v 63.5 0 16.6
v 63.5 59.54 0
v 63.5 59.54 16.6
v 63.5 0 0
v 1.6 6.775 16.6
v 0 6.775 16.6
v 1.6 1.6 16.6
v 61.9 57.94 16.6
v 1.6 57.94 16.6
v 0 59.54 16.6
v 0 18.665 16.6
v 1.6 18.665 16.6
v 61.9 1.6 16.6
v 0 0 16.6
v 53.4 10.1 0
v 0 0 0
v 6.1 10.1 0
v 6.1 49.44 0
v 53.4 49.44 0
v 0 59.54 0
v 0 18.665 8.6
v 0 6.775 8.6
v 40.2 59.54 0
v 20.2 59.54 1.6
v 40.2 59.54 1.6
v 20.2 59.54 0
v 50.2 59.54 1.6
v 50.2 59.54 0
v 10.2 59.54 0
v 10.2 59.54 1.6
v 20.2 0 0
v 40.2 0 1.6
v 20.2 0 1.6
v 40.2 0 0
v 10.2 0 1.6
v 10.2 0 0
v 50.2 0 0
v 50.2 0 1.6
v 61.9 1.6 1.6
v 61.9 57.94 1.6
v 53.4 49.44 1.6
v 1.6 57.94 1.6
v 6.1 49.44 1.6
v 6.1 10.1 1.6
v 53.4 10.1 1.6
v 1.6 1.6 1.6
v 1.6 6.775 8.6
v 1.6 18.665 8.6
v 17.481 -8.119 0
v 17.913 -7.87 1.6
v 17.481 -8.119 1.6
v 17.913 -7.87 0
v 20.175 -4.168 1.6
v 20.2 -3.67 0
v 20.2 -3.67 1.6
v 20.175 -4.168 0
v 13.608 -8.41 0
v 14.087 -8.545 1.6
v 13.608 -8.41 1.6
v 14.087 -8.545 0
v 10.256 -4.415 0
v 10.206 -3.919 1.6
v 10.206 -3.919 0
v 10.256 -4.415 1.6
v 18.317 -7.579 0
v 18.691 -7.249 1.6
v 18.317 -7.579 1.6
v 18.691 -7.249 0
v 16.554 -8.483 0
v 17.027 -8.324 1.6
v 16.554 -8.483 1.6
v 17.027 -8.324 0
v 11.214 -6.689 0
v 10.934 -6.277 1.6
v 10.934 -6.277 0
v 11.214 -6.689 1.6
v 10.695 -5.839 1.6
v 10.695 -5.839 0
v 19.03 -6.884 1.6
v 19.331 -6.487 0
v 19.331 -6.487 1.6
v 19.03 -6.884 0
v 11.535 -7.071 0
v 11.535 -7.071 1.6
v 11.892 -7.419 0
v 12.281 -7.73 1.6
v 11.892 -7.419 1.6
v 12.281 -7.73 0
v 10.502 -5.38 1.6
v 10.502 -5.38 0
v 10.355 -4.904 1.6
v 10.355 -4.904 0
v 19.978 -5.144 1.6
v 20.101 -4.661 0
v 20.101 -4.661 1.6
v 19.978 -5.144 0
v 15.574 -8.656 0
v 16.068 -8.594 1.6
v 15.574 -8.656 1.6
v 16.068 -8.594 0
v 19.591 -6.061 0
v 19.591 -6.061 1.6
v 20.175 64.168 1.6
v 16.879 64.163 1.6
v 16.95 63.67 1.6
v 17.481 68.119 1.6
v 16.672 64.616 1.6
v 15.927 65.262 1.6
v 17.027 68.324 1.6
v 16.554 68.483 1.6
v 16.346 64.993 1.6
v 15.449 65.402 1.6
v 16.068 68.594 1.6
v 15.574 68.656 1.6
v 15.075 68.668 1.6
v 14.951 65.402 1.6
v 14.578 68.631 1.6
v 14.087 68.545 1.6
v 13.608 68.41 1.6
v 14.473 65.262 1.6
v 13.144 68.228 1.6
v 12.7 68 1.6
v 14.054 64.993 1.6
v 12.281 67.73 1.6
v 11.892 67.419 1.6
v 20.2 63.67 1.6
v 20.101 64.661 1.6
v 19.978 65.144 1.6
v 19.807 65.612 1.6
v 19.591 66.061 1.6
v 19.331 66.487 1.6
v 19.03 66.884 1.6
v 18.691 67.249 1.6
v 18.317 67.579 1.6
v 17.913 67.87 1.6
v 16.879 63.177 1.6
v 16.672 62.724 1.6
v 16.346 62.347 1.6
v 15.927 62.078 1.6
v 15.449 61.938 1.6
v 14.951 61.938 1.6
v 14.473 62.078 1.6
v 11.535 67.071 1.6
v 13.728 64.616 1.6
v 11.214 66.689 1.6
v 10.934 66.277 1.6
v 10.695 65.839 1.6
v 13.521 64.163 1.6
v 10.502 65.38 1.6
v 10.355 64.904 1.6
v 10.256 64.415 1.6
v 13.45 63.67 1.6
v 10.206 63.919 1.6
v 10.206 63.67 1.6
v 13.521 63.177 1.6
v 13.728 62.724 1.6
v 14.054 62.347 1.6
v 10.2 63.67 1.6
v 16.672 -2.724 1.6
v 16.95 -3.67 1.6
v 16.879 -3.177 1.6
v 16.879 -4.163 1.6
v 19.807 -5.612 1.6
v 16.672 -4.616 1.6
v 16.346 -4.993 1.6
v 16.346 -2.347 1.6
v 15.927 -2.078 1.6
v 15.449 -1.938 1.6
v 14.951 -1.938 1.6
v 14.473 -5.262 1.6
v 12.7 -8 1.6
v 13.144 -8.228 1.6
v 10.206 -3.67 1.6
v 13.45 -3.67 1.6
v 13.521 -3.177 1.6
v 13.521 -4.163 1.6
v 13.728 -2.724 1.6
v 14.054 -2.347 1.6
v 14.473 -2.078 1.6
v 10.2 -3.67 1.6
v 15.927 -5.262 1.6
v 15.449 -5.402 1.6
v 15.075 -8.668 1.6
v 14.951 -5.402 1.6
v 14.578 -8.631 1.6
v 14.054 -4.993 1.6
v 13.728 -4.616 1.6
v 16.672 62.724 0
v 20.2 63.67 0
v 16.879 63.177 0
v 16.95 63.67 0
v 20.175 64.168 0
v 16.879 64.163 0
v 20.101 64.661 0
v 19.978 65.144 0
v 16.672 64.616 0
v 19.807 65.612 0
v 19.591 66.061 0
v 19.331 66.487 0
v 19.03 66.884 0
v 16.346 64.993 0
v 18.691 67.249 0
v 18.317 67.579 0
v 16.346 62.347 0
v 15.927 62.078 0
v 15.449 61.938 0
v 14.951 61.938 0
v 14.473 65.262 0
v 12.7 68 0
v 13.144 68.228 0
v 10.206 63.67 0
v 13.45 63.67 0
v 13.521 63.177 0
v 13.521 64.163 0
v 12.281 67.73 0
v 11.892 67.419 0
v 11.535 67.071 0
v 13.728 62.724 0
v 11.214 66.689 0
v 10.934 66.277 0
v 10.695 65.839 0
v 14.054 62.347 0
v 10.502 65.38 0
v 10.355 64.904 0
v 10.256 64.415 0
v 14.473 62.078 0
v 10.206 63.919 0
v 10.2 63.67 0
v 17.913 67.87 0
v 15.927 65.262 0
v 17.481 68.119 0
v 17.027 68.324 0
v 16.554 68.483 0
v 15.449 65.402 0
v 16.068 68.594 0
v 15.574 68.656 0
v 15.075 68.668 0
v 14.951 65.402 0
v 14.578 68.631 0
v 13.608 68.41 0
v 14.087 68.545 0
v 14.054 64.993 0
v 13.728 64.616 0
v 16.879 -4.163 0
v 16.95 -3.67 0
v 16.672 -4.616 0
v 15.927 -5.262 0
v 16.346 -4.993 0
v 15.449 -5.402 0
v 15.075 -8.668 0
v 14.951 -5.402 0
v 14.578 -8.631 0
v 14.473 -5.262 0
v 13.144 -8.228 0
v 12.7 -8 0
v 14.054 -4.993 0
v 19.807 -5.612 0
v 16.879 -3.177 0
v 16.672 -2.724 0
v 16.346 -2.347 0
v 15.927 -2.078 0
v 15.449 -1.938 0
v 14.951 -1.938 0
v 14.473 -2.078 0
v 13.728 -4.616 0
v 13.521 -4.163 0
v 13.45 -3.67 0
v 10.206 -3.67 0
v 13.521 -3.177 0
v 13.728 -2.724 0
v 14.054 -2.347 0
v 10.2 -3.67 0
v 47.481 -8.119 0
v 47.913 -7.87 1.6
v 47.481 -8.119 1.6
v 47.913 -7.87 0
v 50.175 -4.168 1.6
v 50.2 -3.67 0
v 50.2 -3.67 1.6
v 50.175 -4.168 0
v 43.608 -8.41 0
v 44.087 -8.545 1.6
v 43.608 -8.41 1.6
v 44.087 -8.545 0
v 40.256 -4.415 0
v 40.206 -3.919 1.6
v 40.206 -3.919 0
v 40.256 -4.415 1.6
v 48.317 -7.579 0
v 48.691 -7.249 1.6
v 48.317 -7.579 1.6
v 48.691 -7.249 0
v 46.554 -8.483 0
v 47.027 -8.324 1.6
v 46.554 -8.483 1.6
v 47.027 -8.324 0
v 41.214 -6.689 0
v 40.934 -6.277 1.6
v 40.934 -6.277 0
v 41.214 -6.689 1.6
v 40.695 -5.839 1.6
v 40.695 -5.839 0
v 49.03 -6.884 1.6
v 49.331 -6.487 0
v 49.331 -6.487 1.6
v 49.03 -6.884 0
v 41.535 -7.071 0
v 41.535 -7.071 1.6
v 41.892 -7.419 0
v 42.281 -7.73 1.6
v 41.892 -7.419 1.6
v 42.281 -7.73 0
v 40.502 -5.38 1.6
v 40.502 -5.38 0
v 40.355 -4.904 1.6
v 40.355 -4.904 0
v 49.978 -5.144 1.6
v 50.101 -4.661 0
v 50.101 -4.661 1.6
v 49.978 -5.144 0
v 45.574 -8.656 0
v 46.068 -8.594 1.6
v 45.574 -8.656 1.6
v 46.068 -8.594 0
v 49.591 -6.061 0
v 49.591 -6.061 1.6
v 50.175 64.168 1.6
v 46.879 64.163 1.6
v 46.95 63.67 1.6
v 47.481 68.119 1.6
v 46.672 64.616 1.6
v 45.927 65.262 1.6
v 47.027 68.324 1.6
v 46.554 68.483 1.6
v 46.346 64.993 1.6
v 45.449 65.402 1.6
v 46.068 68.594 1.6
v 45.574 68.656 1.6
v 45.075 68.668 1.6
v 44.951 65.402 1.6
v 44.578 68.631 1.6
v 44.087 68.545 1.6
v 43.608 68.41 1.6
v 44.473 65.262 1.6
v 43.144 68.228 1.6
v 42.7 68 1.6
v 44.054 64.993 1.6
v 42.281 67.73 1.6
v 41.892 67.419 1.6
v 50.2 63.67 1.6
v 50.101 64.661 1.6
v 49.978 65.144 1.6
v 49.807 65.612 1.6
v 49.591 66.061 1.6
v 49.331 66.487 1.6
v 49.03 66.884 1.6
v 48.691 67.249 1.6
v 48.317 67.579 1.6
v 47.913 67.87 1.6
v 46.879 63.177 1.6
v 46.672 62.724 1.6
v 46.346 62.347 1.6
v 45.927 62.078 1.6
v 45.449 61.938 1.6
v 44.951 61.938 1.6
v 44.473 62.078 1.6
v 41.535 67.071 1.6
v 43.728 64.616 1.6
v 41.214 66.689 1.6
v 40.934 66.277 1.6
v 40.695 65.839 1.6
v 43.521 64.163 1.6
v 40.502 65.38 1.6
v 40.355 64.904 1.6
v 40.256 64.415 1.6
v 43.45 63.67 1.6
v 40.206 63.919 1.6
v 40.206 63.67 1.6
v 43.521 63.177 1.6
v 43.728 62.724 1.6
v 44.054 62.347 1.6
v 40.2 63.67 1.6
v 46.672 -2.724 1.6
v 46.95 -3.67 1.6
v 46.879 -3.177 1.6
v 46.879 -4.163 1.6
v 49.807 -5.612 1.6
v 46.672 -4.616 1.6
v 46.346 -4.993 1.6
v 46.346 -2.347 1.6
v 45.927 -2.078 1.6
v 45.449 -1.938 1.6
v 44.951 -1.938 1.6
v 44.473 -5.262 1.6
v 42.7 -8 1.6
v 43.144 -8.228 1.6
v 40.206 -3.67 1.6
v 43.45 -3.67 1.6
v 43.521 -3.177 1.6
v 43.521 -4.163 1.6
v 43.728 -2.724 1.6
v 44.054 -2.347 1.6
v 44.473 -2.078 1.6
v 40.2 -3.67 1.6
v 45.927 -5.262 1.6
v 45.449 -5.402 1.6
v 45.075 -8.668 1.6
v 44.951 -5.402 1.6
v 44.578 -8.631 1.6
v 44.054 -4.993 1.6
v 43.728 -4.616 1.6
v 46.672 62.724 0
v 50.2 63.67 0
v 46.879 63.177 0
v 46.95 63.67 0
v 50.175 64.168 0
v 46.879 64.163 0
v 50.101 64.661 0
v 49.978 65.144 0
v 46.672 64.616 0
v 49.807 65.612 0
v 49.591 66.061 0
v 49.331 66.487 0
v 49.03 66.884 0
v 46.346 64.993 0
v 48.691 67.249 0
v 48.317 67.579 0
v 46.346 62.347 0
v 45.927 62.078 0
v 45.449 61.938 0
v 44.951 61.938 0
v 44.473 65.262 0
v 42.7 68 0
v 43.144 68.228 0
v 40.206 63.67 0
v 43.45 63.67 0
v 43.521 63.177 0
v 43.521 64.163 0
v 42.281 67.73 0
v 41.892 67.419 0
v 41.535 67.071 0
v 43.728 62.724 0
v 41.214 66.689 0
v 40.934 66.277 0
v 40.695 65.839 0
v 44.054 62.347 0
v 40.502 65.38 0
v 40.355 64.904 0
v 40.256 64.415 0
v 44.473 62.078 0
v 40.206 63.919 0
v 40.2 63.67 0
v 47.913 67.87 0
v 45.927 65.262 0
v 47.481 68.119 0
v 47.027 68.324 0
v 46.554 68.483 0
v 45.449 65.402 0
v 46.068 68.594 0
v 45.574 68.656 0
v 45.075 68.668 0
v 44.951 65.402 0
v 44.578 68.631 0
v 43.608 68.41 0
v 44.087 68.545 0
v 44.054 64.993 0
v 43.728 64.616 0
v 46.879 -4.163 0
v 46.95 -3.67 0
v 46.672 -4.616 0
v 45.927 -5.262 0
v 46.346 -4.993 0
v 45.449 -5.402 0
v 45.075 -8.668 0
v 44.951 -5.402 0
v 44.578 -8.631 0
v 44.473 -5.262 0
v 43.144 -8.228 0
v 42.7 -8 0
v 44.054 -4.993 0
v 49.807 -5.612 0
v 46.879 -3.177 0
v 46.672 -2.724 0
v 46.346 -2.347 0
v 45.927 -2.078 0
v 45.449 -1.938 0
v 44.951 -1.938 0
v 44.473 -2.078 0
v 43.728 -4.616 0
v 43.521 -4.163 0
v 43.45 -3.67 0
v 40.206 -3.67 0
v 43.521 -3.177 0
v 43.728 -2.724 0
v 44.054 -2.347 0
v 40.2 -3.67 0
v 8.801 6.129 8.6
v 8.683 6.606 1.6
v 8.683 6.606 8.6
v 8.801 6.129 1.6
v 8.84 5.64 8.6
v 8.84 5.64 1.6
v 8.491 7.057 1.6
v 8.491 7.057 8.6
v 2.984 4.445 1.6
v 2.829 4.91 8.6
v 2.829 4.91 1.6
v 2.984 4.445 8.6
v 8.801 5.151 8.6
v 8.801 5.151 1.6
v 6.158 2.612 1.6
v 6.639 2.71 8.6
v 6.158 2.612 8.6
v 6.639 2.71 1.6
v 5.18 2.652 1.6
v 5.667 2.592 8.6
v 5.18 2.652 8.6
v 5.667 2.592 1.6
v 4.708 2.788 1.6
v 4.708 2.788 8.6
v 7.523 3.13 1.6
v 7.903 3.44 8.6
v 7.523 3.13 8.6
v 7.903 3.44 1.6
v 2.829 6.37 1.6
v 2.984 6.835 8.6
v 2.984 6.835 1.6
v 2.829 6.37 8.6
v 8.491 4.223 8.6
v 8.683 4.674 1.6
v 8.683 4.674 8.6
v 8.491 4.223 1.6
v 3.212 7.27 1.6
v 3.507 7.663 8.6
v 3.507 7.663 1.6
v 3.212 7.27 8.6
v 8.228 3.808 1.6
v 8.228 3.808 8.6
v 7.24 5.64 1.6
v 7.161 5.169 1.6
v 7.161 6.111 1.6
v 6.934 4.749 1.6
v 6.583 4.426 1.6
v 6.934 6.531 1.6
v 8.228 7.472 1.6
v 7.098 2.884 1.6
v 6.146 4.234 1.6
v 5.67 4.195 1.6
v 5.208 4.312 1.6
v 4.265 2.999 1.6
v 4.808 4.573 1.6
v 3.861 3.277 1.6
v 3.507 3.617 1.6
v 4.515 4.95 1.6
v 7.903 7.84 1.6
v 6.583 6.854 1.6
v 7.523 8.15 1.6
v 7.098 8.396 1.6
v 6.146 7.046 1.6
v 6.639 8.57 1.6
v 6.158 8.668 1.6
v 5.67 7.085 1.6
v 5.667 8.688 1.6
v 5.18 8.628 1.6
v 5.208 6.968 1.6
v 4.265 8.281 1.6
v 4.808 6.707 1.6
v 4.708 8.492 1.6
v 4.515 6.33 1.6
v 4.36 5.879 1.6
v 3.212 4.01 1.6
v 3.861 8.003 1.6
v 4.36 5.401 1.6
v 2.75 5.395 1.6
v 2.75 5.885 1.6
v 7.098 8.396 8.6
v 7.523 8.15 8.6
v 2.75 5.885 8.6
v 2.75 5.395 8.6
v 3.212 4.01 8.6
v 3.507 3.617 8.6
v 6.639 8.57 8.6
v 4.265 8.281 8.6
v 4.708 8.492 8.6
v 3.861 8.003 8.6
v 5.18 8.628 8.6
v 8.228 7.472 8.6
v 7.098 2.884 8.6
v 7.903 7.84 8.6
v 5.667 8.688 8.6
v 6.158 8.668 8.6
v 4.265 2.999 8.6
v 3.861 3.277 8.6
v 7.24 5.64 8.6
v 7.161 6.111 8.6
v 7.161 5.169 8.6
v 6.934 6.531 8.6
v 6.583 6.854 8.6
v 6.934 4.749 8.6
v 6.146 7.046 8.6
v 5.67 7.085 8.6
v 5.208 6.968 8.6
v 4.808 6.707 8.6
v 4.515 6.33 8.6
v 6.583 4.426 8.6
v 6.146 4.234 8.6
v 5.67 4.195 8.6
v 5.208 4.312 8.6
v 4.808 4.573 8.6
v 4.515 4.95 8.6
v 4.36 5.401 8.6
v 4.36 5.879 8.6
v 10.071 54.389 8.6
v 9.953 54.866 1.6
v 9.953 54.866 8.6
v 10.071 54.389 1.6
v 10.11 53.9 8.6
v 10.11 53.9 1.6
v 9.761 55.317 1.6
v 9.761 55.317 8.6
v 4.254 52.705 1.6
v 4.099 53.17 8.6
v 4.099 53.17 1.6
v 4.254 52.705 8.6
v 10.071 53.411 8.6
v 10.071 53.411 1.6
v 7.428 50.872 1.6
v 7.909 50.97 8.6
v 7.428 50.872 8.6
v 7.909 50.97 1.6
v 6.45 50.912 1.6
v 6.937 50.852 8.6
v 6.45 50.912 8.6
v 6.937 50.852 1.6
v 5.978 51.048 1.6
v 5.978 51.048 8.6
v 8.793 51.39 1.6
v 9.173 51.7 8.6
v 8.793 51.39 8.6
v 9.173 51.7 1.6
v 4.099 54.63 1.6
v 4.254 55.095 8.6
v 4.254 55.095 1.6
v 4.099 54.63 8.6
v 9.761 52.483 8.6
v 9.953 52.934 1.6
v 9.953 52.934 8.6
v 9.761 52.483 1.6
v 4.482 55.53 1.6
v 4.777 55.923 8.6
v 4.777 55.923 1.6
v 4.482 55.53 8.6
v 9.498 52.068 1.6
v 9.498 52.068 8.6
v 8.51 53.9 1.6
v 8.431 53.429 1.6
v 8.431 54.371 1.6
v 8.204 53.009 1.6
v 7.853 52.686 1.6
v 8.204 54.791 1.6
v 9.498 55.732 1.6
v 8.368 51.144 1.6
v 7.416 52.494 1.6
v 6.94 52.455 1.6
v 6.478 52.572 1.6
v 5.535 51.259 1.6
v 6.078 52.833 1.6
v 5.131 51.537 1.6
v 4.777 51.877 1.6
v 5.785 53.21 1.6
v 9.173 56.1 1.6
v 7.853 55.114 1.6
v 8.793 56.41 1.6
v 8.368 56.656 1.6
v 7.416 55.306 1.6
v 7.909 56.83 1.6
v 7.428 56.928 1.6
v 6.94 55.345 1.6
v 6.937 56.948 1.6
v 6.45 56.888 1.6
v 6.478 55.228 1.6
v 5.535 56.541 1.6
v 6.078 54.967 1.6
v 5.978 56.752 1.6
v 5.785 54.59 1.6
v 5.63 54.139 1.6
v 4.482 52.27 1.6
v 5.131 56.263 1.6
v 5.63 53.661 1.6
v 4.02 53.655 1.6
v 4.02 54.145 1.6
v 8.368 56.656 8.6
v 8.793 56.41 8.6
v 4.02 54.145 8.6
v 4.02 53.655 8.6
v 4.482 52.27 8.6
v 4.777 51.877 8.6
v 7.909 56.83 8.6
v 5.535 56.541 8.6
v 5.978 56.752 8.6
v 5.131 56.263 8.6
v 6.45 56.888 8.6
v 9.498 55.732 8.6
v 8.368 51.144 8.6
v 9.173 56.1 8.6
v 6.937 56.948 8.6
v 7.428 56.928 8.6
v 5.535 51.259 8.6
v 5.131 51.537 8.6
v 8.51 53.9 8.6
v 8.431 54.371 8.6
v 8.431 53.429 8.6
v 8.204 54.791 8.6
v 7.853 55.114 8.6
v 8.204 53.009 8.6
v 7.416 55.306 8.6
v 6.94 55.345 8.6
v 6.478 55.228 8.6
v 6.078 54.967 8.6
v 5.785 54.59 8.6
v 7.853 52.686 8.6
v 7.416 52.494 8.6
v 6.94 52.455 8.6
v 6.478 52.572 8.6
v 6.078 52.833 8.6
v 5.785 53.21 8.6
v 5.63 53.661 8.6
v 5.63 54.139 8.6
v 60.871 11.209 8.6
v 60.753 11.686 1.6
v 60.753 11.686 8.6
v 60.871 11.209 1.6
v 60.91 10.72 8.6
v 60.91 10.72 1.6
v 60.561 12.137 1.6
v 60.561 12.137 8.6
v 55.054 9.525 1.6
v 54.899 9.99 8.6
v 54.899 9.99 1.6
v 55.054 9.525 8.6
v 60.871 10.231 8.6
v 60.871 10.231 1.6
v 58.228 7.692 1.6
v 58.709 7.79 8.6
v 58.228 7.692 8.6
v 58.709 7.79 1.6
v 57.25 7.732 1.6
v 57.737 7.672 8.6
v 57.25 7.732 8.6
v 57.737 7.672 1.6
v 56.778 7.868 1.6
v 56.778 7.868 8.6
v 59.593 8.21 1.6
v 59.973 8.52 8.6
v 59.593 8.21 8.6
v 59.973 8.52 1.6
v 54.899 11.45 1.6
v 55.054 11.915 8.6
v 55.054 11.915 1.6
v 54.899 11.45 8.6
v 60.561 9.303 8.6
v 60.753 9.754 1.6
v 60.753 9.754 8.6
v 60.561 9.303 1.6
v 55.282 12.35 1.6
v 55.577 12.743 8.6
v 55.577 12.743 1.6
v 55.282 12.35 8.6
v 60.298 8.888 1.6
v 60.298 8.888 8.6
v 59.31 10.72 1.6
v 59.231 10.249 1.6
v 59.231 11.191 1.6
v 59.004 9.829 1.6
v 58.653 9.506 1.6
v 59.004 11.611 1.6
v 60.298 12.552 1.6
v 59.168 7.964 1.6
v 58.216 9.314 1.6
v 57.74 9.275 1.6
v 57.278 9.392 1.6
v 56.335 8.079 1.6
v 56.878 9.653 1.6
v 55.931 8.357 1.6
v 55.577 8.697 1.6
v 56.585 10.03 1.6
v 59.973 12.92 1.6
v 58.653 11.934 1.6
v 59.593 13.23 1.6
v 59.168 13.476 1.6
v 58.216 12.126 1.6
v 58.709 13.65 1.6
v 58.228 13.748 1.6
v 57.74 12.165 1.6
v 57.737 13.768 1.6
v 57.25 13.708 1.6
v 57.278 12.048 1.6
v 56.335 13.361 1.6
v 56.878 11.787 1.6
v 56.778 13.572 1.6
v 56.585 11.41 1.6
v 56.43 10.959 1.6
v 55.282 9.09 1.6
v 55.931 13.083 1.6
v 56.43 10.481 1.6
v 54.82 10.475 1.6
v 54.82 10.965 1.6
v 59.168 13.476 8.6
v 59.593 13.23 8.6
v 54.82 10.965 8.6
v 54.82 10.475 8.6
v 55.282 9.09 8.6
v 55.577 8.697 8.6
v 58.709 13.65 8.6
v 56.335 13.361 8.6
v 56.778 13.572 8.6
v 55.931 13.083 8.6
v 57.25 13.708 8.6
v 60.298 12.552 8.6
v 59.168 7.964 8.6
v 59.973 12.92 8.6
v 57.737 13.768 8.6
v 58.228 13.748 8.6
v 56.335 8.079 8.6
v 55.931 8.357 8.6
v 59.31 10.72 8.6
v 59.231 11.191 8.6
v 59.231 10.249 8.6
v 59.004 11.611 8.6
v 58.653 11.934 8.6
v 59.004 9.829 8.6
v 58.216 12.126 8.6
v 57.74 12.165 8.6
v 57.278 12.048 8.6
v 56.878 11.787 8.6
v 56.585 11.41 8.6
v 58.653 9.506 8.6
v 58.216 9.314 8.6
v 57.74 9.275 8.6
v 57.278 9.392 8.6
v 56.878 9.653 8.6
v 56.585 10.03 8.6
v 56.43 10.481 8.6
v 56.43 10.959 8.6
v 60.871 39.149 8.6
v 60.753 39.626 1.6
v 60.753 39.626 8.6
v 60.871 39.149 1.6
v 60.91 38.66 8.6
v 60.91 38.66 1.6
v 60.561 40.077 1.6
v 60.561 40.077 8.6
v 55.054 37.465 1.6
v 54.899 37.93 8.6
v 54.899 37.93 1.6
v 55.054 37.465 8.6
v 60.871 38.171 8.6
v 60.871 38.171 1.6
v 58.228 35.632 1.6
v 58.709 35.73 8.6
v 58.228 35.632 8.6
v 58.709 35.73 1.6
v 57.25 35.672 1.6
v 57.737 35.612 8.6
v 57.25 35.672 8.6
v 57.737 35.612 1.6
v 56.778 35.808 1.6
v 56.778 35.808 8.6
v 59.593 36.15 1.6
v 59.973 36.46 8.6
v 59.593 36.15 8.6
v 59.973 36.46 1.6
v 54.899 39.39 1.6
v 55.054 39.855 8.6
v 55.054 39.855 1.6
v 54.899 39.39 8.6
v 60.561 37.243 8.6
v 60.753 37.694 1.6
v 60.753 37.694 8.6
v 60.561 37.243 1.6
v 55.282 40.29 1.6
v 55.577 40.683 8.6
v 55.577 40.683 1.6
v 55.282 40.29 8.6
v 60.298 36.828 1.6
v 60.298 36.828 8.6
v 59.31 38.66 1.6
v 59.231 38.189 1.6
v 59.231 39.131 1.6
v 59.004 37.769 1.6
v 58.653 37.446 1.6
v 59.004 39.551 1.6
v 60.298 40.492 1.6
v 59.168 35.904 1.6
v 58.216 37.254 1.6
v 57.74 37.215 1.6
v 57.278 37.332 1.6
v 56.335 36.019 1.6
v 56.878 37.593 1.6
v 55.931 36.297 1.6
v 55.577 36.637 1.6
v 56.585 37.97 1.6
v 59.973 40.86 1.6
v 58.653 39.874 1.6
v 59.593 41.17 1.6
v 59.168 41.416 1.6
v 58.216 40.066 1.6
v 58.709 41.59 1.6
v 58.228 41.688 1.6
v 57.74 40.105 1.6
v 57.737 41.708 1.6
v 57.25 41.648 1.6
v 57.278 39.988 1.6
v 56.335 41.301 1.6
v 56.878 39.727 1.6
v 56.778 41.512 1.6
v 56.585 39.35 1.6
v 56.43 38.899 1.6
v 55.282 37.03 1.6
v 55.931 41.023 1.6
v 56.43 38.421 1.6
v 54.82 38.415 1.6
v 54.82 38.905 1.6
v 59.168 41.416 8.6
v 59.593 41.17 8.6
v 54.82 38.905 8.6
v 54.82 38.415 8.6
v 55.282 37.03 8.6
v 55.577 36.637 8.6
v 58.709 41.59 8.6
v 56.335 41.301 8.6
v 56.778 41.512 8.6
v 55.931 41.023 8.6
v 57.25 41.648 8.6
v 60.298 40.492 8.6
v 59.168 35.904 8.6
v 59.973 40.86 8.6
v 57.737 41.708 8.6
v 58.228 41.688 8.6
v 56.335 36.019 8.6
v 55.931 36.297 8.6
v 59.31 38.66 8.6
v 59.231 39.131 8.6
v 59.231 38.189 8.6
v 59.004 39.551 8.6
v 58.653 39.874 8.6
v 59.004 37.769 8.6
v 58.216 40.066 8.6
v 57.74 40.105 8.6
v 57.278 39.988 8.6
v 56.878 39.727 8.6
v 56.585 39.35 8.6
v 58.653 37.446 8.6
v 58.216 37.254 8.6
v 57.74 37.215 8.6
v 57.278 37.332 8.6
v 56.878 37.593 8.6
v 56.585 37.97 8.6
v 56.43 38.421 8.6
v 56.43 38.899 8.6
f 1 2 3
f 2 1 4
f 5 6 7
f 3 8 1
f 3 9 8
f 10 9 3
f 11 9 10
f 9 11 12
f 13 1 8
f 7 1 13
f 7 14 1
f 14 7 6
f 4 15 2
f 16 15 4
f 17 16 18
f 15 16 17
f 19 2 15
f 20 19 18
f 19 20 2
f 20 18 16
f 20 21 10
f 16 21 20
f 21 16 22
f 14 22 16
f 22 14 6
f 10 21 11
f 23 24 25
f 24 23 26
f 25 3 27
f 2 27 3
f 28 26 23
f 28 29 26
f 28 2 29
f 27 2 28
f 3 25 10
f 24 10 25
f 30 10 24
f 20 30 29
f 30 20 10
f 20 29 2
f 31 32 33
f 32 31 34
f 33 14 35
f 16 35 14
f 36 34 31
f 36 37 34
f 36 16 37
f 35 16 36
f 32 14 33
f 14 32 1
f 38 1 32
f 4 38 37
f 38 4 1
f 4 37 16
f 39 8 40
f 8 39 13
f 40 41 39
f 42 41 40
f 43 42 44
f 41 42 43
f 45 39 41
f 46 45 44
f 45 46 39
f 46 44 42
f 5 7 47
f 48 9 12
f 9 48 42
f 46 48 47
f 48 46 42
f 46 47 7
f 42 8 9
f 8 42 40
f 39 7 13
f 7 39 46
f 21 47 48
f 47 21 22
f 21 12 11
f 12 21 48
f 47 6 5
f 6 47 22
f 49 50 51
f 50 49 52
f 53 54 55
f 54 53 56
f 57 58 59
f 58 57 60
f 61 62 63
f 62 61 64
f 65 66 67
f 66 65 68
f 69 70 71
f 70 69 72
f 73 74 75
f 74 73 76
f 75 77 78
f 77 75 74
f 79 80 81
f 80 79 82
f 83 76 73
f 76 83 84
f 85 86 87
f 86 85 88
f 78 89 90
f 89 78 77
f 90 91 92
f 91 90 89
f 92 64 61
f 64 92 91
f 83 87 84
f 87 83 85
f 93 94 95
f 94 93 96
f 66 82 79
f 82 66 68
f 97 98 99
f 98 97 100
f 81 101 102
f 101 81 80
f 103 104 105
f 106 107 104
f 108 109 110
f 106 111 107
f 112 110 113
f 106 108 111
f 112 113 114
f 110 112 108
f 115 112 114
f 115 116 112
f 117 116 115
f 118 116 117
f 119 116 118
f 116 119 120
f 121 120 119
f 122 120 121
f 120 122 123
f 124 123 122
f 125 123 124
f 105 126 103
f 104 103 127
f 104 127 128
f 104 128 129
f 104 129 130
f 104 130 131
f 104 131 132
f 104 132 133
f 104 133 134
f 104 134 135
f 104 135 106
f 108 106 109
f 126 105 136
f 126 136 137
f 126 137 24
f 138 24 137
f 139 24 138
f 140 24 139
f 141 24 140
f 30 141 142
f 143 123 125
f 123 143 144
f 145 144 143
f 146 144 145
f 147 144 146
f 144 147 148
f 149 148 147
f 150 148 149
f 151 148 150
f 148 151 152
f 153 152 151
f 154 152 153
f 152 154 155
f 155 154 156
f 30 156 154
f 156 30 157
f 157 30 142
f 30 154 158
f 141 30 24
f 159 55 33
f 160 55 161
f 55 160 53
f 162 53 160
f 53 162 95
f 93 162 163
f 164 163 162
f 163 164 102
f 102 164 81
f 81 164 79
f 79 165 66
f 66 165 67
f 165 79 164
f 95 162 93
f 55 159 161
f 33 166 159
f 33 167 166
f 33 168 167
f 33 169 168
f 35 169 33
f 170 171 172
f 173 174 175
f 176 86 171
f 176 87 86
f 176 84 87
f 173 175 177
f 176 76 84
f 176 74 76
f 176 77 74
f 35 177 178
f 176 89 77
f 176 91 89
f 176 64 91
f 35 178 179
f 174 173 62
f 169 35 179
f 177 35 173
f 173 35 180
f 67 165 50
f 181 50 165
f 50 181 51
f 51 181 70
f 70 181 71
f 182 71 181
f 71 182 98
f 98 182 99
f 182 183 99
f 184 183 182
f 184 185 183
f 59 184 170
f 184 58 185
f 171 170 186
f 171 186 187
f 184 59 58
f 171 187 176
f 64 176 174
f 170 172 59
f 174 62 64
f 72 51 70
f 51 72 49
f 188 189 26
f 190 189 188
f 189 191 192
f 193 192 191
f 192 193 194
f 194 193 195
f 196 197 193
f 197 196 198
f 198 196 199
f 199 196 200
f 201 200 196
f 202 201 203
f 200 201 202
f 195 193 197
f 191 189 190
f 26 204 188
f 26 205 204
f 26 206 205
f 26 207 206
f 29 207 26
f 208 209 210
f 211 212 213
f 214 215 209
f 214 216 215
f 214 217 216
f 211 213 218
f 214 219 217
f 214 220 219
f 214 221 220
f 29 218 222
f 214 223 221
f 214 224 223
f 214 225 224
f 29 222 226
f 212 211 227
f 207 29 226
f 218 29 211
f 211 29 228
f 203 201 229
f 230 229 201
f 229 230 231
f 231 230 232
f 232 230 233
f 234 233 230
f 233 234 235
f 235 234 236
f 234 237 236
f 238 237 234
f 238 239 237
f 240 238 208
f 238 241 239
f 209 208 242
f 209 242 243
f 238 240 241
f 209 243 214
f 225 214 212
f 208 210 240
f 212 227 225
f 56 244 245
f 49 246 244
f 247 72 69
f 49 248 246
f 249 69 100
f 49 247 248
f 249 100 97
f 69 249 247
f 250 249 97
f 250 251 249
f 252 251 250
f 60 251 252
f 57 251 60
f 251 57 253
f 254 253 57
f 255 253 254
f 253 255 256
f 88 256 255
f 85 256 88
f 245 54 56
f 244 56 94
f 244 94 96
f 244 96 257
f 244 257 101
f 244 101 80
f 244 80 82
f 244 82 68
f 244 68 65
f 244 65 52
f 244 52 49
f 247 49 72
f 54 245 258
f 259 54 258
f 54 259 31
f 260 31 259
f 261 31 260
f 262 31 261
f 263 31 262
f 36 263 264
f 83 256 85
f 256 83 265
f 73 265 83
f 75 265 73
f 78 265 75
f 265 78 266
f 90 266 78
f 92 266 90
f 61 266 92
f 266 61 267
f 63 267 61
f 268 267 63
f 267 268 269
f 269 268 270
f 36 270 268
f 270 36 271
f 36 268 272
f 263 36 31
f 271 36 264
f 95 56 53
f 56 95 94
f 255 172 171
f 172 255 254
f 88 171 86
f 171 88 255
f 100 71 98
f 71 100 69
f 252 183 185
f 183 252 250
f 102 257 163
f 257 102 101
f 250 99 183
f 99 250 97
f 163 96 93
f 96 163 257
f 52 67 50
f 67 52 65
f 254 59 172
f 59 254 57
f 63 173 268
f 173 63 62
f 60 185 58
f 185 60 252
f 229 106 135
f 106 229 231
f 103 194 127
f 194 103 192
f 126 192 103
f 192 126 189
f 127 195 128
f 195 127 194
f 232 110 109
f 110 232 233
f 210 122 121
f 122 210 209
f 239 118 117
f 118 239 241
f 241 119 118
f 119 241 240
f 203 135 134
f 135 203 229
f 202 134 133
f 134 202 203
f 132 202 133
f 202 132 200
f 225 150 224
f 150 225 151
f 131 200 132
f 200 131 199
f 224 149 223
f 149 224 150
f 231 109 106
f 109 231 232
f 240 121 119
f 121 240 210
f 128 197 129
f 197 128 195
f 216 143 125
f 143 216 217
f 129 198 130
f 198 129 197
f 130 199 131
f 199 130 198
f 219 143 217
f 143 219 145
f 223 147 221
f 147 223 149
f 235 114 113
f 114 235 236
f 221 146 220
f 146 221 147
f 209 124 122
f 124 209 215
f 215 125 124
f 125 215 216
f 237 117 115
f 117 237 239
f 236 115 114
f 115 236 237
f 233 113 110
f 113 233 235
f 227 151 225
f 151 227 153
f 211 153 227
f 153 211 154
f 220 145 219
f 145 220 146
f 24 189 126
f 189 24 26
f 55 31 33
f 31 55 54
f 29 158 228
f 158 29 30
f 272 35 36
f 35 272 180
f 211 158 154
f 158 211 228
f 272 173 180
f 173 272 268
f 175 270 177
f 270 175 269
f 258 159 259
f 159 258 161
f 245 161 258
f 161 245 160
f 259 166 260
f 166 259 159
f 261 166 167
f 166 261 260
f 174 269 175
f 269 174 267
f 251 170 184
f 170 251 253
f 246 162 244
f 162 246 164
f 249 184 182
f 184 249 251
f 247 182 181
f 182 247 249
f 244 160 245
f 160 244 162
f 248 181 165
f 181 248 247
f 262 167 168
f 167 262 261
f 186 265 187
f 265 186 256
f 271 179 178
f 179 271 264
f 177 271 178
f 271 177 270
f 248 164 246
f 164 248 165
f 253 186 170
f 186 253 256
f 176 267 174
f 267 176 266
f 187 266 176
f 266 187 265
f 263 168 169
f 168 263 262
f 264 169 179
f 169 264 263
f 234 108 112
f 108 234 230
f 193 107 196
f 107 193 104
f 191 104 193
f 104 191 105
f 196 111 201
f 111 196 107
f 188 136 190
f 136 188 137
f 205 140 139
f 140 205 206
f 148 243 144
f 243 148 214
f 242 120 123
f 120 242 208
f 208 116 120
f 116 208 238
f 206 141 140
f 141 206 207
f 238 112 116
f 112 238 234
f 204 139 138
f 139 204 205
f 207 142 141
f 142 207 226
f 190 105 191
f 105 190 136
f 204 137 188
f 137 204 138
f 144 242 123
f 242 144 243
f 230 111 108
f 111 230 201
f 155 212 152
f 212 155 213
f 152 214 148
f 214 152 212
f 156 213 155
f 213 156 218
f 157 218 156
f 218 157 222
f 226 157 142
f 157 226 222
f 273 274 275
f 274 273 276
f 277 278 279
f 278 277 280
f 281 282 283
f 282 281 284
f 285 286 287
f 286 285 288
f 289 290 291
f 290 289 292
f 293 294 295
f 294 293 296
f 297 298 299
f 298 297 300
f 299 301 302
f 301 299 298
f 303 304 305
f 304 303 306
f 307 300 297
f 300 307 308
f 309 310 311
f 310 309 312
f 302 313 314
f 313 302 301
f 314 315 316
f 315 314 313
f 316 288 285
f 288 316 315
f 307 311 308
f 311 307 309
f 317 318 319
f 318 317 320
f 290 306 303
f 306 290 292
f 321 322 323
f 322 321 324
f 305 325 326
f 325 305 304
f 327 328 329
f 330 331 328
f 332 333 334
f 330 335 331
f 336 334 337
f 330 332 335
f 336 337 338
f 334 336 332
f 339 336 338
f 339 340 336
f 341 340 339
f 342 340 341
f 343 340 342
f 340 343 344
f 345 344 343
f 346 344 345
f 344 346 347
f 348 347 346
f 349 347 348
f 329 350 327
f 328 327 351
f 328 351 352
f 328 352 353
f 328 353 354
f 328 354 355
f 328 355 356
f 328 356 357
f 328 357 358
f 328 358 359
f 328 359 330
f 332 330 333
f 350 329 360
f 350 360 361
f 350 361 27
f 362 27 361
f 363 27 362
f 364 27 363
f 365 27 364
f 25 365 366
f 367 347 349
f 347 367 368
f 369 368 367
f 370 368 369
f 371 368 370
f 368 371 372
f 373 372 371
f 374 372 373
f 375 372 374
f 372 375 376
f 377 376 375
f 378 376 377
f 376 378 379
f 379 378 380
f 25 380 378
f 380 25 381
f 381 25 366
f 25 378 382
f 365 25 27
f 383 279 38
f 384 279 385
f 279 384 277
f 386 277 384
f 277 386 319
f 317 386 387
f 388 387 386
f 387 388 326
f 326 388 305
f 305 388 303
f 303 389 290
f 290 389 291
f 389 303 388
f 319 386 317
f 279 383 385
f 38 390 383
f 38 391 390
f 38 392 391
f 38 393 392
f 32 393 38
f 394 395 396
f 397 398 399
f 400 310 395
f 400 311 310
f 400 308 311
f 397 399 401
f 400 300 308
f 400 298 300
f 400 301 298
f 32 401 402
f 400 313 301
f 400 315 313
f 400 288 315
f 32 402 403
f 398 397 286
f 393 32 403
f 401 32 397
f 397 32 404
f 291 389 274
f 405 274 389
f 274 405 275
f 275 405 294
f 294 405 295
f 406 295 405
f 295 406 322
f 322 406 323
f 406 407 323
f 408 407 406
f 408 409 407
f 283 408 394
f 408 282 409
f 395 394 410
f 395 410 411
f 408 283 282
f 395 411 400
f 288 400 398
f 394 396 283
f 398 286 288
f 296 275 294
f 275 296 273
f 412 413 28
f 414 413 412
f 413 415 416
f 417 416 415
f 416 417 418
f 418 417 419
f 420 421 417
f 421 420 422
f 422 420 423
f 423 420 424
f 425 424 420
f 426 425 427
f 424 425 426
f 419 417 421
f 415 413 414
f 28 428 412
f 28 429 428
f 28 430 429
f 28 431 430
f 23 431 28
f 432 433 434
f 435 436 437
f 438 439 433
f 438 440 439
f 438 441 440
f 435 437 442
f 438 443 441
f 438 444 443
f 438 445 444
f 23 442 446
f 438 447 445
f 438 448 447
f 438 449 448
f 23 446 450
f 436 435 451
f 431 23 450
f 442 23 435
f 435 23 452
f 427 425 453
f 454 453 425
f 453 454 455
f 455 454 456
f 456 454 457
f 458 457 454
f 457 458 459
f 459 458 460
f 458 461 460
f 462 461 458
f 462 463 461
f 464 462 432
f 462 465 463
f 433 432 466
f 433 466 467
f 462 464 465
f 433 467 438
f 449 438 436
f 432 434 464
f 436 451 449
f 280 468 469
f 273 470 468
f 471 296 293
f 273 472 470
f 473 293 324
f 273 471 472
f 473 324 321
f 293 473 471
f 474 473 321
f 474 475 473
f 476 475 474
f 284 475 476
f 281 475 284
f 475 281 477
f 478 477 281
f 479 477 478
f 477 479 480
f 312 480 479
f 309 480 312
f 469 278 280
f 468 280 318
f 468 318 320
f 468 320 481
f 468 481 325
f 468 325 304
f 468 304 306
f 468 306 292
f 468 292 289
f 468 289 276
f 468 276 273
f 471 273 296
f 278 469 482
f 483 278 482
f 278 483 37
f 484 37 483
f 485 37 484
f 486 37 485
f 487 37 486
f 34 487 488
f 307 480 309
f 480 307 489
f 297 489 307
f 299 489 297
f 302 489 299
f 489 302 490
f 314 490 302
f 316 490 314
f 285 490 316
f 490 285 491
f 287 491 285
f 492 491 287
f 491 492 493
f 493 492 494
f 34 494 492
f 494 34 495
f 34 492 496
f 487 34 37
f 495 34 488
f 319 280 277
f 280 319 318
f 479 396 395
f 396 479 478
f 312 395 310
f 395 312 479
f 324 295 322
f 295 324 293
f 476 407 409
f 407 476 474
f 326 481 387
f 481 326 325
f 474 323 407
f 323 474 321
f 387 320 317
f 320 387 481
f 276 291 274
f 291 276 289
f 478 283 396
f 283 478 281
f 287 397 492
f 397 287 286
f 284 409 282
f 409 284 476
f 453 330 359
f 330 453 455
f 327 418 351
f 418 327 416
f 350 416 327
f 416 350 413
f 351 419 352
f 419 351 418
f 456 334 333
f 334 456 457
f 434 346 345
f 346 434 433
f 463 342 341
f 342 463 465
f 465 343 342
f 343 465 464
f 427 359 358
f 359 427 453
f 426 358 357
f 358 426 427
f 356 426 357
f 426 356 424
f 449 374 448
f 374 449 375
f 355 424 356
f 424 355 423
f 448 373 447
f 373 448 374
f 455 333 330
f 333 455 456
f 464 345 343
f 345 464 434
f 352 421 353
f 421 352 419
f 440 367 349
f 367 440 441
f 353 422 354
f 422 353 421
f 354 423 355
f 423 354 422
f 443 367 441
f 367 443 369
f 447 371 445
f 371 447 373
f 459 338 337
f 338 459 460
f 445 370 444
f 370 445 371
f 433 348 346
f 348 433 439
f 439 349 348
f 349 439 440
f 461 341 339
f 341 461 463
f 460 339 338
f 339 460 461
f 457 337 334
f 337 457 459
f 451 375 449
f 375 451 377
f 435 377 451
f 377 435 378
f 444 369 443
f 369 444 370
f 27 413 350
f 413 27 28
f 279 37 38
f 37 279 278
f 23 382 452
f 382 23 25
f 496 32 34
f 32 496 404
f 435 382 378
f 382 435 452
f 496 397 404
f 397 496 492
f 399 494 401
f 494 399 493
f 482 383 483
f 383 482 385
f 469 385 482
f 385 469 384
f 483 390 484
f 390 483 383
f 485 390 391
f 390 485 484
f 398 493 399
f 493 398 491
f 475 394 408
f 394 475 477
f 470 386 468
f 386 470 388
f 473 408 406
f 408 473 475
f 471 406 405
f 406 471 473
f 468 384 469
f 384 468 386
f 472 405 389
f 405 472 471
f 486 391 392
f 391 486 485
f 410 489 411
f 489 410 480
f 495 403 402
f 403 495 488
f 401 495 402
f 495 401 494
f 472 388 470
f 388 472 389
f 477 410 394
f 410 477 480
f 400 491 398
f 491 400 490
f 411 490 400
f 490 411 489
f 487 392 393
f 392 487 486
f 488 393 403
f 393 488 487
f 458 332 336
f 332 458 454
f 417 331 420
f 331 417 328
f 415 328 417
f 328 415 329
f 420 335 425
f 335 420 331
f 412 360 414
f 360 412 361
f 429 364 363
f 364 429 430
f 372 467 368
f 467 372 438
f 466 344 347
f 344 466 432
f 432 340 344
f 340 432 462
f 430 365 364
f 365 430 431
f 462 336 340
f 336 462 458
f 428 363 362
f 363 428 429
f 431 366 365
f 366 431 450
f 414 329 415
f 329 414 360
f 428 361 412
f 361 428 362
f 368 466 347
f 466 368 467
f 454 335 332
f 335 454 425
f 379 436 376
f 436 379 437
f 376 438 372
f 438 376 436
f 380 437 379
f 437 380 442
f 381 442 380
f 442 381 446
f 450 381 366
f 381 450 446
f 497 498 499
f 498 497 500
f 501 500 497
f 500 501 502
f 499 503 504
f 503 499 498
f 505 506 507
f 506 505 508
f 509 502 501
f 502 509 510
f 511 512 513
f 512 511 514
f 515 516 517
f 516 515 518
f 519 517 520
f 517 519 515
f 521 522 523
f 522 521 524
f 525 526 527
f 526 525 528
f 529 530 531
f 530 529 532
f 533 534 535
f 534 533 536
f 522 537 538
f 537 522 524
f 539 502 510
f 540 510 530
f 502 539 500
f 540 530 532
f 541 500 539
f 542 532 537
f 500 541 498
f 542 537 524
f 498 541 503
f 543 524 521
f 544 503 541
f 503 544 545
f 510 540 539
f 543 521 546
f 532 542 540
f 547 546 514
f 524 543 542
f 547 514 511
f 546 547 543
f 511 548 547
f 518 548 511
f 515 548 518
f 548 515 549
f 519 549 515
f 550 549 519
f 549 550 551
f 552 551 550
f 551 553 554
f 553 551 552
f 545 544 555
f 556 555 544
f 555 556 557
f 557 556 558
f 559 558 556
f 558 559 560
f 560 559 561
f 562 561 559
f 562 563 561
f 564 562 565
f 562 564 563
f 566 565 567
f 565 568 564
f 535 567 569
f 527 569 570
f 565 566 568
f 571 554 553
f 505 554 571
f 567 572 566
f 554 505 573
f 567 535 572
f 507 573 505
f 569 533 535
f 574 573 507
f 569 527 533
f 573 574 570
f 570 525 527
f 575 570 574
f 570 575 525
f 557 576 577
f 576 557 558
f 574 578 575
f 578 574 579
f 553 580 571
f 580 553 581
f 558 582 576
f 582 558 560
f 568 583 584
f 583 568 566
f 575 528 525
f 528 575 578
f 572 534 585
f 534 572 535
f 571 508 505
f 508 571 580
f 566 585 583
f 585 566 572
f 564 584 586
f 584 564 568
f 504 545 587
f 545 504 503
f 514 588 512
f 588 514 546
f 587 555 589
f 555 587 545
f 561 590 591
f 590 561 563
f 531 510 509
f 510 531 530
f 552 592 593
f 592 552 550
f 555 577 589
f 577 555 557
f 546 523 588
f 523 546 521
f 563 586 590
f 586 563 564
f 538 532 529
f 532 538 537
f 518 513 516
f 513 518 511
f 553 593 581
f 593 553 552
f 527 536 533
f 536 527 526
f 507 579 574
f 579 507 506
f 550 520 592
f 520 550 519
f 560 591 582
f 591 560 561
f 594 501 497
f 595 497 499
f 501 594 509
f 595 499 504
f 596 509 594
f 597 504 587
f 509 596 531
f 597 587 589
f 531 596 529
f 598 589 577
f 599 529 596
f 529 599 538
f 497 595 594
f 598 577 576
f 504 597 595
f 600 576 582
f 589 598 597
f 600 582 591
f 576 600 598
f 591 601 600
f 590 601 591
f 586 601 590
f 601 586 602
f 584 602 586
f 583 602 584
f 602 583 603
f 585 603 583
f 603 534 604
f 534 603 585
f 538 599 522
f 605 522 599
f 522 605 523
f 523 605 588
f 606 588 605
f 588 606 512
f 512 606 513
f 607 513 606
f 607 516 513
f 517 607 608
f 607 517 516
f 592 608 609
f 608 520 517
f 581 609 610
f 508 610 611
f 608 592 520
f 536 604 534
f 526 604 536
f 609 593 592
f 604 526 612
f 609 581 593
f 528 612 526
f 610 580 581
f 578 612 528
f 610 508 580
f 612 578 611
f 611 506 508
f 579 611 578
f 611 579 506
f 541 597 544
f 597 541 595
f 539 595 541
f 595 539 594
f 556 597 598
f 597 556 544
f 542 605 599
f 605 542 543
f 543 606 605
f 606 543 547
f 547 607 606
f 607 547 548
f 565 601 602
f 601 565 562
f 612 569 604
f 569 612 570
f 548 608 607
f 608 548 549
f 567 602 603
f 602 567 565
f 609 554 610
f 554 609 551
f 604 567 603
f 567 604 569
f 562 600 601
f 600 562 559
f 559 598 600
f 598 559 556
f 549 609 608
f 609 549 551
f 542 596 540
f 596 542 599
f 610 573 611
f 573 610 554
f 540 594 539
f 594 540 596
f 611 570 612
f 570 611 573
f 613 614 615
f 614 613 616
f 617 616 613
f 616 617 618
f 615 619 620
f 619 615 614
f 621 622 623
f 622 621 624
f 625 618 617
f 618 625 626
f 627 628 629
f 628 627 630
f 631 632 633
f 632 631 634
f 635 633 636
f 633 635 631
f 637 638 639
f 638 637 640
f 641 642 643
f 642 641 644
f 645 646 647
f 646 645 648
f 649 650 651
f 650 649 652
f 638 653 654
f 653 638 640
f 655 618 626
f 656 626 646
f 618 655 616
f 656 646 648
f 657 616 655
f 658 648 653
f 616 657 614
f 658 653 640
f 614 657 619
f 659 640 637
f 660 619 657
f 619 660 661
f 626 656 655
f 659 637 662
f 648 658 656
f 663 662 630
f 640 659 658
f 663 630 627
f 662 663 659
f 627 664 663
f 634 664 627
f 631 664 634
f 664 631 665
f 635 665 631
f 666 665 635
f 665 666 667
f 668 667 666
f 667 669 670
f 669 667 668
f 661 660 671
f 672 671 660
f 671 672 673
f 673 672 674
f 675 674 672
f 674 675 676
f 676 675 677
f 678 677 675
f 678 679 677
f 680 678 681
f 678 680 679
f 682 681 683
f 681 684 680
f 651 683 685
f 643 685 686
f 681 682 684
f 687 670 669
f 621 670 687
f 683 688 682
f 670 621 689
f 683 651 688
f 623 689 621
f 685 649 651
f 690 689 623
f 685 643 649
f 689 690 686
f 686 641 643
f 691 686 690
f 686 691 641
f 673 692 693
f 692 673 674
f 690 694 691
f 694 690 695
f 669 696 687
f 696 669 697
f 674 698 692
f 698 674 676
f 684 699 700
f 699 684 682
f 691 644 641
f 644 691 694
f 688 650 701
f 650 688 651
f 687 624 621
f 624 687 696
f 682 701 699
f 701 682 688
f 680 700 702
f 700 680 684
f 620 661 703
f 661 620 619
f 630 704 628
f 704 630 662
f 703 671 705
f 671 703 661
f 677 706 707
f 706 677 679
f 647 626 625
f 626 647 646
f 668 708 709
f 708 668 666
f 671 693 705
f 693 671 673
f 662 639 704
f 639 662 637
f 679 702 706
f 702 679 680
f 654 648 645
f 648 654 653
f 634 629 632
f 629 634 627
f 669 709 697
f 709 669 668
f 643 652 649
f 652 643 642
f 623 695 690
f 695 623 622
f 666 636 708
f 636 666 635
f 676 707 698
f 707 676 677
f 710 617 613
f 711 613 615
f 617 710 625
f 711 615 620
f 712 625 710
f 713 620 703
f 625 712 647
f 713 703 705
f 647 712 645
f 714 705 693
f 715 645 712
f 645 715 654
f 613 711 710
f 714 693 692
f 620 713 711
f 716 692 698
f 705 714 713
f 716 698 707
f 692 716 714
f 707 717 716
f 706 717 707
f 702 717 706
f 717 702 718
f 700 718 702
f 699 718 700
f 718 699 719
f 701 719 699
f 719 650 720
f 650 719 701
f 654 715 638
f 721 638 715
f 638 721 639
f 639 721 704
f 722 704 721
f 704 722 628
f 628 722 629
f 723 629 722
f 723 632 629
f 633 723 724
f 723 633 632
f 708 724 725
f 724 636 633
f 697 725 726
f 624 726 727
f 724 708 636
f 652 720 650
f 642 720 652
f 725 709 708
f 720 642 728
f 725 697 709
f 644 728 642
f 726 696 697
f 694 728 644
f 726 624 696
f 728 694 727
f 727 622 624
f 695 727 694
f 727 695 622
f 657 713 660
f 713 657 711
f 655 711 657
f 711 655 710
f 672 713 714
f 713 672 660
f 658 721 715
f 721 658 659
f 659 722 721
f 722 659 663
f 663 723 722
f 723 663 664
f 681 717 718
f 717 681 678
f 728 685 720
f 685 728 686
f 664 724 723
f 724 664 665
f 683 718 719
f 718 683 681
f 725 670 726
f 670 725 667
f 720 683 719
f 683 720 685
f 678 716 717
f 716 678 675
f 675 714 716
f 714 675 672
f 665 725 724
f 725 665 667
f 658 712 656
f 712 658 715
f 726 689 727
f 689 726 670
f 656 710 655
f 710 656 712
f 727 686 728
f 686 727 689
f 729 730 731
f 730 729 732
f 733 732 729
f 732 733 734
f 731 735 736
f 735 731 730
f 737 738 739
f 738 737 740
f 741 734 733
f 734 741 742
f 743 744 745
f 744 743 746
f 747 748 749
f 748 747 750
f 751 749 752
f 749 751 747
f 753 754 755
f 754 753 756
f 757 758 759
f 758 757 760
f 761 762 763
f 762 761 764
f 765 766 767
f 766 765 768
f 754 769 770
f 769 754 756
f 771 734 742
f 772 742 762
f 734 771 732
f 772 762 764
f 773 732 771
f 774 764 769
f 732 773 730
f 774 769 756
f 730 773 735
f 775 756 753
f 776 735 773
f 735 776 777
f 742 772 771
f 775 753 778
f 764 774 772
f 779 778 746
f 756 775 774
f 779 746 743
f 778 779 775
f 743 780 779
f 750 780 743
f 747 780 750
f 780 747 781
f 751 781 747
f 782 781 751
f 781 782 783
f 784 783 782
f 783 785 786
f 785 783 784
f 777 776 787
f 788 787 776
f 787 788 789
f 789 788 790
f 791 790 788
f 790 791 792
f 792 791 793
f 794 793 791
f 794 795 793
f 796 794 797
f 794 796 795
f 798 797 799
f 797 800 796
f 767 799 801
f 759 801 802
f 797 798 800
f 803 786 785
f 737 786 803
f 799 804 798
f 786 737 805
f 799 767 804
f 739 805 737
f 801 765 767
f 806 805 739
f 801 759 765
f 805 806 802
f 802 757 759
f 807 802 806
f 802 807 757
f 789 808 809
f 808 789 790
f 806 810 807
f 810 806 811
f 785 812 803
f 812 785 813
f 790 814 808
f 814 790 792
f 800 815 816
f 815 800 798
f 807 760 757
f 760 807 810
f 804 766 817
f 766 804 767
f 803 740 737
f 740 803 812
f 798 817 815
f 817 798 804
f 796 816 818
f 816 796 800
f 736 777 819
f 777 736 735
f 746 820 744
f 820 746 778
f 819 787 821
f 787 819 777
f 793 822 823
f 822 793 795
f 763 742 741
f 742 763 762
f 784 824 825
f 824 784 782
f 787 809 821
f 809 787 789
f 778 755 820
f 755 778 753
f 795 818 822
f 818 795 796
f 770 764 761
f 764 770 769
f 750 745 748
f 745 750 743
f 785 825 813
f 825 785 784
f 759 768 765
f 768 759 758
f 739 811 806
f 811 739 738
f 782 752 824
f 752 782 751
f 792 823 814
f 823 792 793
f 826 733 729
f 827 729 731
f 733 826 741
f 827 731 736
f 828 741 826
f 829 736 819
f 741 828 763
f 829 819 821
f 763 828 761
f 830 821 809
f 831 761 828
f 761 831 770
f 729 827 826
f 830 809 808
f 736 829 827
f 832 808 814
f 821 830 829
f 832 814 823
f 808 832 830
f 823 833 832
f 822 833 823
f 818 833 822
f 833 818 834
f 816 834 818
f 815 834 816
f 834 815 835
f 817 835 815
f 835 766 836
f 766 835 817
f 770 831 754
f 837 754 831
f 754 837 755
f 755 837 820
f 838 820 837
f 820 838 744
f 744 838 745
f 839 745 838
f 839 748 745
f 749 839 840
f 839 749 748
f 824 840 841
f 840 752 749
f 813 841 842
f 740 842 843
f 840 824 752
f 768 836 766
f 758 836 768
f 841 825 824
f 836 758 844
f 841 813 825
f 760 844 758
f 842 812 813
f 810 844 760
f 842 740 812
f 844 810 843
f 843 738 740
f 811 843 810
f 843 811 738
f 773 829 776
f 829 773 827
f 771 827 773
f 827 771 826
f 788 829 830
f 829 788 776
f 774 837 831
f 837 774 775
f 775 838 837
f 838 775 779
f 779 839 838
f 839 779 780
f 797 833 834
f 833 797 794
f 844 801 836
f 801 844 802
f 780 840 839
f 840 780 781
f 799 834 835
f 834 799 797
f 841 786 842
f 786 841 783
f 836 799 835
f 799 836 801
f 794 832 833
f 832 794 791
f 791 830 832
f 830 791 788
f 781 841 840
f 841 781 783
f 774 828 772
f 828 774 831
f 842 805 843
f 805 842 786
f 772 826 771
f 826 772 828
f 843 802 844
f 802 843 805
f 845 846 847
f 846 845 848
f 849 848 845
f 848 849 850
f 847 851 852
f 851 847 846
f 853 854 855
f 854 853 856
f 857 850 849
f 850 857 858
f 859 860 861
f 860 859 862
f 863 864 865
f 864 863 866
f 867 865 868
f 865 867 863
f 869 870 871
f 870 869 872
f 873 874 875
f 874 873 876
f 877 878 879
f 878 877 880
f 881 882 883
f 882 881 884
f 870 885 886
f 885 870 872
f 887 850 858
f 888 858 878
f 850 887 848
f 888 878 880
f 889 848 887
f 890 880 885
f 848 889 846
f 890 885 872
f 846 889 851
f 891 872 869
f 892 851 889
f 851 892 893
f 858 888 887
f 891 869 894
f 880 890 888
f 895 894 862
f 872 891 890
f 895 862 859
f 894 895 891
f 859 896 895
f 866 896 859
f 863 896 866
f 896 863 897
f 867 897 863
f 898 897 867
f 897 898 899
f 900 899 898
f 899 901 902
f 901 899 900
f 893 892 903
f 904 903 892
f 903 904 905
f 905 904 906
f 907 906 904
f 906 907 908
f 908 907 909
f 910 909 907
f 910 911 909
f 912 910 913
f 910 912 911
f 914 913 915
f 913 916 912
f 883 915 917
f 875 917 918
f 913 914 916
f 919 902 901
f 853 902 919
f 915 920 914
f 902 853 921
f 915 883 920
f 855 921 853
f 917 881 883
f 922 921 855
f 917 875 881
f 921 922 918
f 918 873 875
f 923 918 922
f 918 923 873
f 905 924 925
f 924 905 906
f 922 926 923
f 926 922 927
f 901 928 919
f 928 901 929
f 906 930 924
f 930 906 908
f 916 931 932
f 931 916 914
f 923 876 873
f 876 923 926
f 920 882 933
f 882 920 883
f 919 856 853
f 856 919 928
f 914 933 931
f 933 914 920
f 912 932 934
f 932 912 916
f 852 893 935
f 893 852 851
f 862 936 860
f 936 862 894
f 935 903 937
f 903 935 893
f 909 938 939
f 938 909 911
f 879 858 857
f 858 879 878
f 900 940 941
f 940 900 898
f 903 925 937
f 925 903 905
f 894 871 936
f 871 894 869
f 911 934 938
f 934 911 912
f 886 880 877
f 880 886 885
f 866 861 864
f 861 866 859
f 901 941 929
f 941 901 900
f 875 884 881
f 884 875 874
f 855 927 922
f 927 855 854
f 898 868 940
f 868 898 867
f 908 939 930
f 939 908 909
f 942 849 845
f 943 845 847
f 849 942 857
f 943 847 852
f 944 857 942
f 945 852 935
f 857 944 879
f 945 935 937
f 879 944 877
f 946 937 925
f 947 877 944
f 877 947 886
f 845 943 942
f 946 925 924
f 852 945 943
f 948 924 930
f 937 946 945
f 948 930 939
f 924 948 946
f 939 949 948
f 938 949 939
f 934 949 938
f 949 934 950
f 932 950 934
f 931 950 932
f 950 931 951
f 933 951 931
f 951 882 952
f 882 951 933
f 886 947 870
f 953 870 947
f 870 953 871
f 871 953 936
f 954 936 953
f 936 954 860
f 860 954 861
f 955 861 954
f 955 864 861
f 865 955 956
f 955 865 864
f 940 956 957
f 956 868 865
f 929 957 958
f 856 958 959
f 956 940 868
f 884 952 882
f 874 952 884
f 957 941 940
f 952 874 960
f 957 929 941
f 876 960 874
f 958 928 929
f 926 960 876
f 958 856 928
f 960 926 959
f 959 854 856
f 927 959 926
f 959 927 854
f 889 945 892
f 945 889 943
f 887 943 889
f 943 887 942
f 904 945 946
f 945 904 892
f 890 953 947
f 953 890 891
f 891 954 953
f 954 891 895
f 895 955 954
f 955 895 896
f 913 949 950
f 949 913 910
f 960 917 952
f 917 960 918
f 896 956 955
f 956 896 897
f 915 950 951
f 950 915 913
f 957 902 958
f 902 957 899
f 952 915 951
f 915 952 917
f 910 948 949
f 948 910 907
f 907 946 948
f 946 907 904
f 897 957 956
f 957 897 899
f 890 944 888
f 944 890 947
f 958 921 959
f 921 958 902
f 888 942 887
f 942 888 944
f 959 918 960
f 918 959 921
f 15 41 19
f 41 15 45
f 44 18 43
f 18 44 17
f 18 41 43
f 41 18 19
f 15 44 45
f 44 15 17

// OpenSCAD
//design and code by emanresu (http://www.thingiverse.com/Emanresu)
//generates a simple tray with standoffs for an arduino to sit in


//CUSTOMIZER VARIABLES

//arduino type
arduino_type = "NanoExt"; //[Uno,Mega,NanoExt]

//thickness of side walls and bottom (mm)
thick = 1.6;
//height of side walls (mm)
wall_height = 15;
//height of standoff (mm)
standoff_height = 7;
//standoff hole diameter (mm)
standoff_hole_diameter = 2.9;
//standoff thickness (mm)
standoff_thick = 1.6;
//clearance between arduino and sidewalls (mm)
clearance = 1.5;

// make bottom hole to speed up printing (For Uno and Nano only)
bottom_hole = 1;

/* [Hidden] */

//sets openSCAD resolution for nice, round holes
$fa=1;
$fs=0.5;

base_x = (arduino_type == "Mega" ? 101.6 : (arduino_type == "NanoExt" ? 57.3 : 68.58));
base_y = 53.34;

   ///////////////
  //  Modules  //
 ///////////////

module Arduino_standoffs() {
	// body...
	//arranging standoffs
	translate([13.97, 2.54, standoff_height/2]) {
		difference() {
			cylinder(r=standoff_hole_diameter/2+standoff_thick, h=standoff_height, center=true);
			cylinder(r=standoff_hole_diameter/2, h=standoff_height+1, center=true);
		}	
	}
	translate([15.24, 50.8, standoff_height/2]) {
		difference() {
			cylinder(r=standoff_hole_diameter/2+standoff_thick, h=standoff_height, center=true);
			cylinder(r=standoff_hole_diameter/2, h=standoff_height+1, center=true);
		}	
	}
	translate([66.04, 7.62, standoff_height/2]) {
		difference() {
			cylinder(r=standoff_hole_diameter/2+standoff_thick, h=standoff_height, center=true);
			cylinder(r=standoff_hole_diameter/2, h=standoff_height+1, center=true);
		}	
	}
	translate([66.04, 35.56, standoff_height/2]) {
		difference() {
			cylinder(r=standoff_hole_diameter/2+standoff_thick, h=standoff_height, center=true);
			cylinder(r=standoff_hole_diameter/2, h=standoff_height+1, center=true);
		}	
	}
	
	if (arduino_type == "Mega") {
		//adds extra standoffs for Mega, if specified
		translate([90.17, 50.8, standoff_height/2]) {
			difference() {
				cylinder(r=standoff_hole_diameter/2+standoff_thick, h=standoff_height, center=true);
				cylinder(r=standoff_hole_diameter/2, h=standoff_height+1, center=true);
			}	
		}
		translate([96.52, 2.54, standoff_height/2]) {
			difference() {
				cylinder(r=standoff_hole_diameter/2+standoff_thick, h=standoff_height, center=true);
				cylinder(r=standoff_hole_diameter/2, h=standoff_height+1, center=true);
			}	
		}	
	}
}

module Arduino_case_body() {
	// body...
	
	//sets length for type of arduino specified, 101.6 mm for Mega, 68.58 mm for Uno
	
  difference() {
    cube(size=[base_x+2*thick+2*clearance, base_y+2*thick+2*clearance, wall_height+thick], center=false);
    translate([thick, thick, thick]) {
      //main compartment
      cube(size=[base_x+2*clearance, base_y+2*clearance, wall_height+1], center=false);
    }
    translate([thick/2, 7.62+thick+clearance+(arduino_type=="NanoExt" ? 2 : 0), wall_height/2+thick+standoff_height]) {
      //power plug gap
      cube(size=[thick+1, 8.89+2*clearance, wall_height], center=true);
    }
    if(arduino_type != "NanoExt") {
      translate([thick/2, 38.1+thick+clearance,wall_height/2+thick+standoff_height]) {
        //USB plug gap
        cube(size=[thick+1, 11.43+2*clearance, wall_height], center=true);
      }
    }
  }	
}

module arduino_case_attachments() {
  for(ix=[-1, 1]) {
    translate([ix*15, 0, 0]) {
      difference() {
        union() {
          cube([10, base_y+14, thick], center=true);
          for(iy=[-1,1]) {
            translate([0, iy*(base_y+14)/2, 0]) {
              cylinder(d=10, h=thick, center=true);
            }
          }
        }
        for(iy=[-1,1]) {
          translate([0, iy*(base_y+14)/2, 0]) {
            cylinder(d=3.5, h=thick, center=true);
          }
        }
      }
    }
  }
}


   ////////////////////
  //  Control Code  //
 ////////////////////

difference() {
  union() {
    //Joins case body with standoffs
    Arduino_case_body();
    translate([(thick+clearance+base_x)/2, 30, thick/2]) {
      arduino_case_attachments();
    }
    translate([thick+clearance-(arduino_type == "NanoExt" ? 68.58-57.3 : 0), thick+clearance, thick]) {
      Arduino_standoffs();
    }
  }
  if(bottom_hole && arduino_type != "Mega") {
    translate([thick+clearance+3, thick+clearance+7, 0]) {
      cube(size=[base_x-10, base_y-14, wall_height+thick], center=false);
    }
  }
}
